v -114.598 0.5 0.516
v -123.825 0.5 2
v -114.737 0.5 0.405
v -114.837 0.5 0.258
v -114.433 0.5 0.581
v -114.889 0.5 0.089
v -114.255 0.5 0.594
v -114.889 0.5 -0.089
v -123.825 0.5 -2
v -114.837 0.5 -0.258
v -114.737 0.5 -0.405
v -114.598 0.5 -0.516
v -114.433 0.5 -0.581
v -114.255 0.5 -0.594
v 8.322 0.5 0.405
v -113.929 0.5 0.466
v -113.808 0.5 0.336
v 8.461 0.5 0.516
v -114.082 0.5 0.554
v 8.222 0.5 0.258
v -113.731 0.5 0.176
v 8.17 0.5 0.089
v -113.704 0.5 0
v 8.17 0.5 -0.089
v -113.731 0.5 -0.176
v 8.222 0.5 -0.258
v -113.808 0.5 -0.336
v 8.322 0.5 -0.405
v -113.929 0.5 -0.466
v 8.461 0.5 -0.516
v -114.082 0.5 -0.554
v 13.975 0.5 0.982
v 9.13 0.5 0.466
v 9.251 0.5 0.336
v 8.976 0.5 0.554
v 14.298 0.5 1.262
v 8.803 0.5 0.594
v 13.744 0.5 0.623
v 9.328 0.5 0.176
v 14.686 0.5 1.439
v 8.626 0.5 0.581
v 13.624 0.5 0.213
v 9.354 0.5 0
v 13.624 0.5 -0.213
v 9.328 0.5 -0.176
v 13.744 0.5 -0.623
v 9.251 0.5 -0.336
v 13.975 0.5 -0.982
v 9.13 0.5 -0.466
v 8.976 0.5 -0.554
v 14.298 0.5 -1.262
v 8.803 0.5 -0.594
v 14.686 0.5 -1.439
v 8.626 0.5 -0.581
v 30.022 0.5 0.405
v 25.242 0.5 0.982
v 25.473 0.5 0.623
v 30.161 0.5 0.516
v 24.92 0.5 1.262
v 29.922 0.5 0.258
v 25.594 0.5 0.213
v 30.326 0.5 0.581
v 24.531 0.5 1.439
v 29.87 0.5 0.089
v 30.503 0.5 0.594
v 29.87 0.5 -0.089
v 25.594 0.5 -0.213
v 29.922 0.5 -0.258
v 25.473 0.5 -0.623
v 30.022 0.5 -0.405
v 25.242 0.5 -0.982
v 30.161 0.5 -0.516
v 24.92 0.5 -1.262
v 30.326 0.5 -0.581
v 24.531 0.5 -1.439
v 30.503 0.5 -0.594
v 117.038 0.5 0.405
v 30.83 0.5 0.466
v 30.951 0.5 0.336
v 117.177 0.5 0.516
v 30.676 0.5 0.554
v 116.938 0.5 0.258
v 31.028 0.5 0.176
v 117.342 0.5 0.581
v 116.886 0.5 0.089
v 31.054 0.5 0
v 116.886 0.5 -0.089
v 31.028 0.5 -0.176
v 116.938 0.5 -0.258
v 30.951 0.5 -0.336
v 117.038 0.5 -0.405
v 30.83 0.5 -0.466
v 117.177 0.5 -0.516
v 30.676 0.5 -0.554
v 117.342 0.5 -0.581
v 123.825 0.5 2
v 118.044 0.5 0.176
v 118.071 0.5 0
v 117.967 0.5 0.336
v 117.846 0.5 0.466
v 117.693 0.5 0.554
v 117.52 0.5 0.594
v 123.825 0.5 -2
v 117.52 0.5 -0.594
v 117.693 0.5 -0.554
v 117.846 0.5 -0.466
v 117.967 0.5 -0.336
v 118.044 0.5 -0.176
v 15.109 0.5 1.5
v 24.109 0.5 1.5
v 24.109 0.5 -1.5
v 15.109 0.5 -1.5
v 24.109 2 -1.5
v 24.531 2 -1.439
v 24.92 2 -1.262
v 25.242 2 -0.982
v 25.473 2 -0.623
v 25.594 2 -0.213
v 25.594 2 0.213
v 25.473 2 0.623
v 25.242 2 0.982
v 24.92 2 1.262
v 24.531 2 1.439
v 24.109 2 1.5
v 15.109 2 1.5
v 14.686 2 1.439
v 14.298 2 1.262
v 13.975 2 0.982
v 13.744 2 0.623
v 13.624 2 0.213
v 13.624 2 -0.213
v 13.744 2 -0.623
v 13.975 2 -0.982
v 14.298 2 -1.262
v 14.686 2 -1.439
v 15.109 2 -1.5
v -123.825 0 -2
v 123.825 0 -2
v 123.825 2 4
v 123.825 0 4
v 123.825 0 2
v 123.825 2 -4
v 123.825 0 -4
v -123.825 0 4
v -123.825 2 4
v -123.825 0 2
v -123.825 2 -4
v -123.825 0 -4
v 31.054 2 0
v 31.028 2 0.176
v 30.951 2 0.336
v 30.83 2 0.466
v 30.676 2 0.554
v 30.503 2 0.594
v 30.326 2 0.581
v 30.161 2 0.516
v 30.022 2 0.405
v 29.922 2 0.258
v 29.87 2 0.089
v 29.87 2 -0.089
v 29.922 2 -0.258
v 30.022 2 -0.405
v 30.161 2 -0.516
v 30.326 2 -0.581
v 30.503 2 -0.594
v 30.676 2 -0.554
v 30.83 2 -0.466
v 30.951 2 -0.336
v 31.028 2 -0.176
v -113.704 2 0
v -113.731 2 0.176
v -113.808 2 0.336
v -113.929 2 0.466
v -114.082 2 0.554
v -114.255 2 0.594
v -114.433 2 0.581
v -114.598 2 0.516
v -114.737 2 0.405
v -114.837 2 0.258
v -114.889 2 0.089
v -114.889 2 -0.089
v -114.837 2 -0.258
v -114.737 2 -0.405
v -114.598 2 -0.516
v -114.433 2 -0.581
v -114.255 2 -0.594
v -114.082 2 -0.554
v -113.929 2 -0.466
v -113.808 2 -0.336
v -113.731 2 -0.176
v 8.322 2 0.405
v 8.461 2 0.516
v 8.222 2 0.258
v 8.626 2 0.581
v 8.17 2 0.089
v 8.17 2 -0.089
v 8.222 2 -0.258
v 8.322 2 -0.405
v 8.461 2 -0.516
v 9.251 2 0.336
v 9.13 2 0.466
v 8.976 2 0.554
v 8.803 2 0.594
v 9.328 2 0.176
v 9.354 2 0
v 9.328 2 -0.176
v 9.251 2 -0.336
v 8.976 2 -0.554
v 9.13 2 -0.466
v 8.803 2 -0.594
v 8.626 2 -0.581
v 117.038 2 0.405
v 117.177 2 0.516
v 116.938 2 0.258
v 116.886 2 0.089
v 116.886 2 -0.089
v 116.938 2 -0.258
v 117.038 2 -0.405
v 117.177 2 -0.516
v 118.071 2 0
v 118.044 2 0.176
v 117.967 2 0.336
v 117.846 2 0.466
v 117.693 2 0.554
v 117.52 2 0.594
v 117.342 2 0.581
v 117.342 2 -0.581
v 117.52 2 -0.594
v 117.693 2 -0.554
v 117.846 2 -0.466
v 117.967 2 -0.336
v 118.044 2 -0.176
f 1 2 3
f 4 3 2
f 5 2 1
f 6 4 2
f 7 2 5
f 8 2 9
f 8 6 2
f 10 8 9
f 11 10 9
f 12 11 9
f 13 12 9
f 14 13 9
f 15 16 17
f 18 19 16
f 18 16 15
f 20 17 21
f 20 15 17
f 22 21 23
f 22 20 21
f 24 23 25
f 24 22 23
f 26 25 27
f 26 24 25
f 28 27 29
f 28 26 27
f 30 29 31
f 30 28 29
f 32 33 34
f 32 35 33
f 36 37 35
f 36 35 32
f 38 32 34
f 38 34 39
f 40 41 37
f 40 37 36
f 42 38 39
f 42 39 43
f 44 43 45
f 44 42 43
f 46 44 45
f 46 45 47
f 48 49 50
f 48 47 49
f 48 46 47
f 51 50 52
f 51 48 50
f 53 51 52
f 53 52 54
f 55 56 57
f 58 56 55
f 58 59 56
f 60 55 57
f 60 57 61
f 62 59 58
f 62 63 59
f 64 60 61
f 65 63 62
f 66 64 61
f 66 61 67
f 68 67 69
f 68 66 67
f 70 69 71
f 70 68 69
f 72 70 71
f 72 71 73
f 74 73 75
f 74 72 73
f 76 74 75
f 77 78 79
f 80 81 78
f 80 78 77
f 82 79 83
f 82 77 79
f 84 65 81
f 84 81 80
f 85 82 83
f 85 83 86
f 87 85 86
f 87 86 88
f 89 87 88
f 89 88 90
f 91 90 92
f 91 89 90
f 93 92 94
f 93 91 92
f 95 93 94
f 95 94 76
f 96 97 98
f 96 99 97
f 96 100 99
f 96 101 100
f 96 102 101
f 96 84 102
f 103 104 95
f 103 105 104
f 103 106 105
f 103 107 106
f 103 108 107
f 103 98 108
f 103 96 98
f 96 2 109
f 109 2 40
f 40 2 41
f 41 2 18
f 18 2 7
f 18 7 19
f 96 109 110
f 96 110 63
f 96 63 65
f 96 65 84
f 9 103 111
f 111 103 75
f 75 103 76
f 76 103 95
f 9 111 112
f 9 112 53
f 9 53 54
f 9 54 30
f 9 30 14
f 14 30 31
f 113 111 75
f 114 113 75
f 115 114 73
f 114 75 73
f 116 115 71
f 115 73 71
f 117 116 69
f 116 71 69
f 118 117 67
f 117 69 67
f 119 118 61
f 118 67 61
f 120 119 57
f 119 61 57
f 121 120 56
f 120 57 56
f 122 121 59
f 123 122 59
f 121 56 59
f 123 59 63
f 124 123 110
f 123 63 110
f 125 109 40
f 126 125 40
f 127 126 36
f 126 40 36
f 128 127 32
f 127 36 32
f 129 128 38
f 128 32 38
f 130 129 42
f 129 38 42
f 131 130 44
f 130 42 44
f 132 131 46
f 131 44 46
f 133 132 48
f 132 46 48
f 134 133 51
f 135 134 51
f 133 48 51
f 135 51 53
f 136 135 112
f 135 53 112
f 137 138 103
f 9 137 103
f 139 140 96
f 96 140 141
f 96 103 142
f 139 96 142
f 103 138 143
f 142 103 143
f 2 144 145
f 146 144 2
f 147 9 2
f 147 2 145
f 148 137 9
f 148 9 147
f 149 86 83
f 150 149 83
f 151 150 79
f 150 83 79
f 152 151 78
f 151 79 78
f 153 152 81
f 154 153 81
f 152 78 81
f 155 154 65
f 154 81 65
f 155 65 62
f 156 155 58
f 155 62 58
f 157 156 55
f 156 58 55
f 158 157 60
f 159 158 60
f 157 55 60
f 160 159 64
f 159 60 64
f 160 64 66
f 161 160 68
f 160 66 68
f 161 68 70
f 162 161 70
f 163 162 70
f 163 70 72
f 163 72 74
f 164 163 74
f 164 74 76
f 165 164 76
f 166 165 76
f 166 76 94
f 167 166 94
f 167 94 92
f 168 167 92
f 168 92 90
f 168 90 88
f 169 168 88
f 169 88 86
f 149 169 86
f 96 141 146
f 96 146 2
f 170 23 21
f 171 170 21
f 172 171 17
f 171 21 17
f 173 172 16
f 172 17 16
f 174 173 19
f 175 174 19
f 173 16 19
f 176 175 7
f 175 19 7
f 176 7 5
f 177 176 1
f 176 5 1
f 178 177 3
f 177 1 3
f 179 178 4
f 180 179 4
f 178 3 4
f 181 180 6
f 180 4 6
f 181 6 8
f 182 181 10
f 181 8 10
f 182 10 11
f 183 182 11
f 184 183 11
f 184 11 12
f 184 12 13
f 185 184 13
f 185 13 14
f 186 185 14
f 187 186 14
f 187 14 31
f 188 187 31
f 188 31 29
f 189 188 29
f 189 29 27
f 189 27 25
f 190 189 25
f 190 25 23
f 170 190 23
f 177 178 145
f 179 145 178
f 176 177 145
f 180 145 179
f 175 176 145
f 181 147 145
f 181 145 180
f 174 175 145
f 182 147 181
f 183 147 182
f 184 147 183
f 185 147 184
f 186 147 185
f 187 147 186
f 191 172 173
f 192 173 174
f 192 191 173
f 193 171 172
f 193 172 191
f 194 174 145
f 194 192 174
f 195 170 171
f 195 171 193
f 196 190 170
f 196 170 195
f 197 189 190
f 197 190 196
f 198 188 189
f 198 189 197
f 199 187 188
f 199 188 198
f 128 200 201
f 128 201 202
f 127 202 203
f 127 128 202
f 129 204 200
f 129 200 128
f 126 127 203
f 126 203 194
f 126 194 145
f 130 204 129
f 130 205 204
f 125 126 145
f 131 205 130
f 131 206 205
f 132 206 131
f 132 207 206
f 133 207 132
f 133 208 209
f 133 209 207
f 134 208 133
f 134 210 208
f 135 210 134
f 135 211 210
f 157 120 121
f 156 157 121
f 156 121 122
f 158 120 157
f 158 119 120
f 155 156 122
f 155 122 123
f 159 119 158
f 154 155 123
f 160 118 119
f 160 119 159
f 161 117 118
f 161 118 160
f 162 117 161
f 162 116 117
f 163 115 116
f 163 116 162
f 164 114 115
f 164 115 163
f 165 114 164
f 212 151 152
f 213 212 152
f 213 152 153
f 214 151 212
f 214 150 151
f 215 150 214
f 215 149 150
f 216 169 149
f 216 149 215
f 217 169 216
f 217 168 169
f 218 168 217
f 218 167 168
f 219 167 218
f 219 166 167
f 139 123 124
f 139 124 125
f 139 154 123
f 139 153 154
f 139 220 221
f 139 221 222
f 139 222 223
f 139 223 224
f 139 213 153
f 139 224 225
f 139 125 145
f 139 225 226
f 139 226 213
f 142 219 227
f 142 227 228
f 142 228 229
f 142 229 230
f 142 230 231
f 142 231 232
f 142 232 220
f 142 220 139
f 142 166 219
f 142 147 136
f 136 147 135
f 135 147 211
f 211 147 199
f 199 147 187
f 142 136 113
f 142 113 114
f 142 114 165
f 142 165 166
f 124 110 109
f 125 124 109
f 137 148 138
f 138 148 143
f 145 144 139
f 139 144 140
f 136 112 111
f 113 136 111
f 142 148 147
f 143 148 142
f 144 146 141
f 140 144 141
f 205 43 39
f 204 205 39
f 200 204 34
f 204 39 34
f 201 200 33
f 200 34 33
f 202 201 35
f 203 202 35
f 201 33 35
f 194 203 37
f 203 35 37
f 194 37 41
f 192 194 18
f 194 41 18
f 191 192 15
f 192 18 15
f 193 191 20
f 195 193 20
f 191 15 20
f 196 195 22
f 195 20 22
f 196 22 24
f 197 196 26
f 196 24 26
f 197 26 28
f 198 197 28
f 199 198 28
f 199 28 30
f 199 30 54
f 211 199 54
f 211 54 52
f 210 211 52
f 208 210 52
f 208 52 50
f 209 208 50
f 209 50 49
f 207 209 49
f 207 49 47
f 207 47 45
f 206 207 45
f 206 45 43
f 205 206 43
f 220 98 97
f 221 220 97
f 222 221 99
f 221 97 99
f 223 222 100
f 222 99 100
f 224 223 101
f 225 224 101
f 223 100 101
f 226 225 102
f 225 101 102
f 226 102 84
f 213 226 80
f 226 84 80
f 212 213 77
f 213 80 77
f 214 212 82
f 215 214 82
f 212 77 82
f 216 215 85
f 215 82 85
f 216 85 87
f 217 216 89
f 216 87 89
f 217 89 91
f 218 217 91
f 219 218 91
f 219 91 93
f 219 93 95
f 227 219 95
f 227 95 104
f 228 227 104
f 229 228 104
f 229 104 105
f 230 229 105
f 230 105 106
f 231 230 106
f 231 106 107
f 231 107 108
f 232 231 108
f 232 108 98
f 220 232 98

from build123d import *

# Parameters (mm, degrees)
SKETCH1_W                 = 247.65
SKETCH1_H                 = 8
BOSS_EXTRUDE1_DEPTH       = 2
SKETCH2_W                 = 4
SKETCH2_H                 = 1
CUT_EXTRUDE1_DEPTH        = 248.65
CUT_EXTRUDE2_DEPTH        = 2.5
F_0_80_TAPPED_HOLE1_D     = 1.19126
F_0_80_TAPPED_HOLE1_DEPTH = 4.572
F_0_80_TAPPED_HOLE1_TIP   = 0.357890611


with BuildPart() as part:
    # Sketch1 → Boss-Extrude1 (new body)
    with BuildSketch(Plane(origin=(0, 0, 0), x_dir=(1, 0, 0), z_dir=(0, 1, 0))):
        Rectangle(SKETCH1_W, SKETCH1_H)
    extrude(amount=BOSS_EXTRUDE1_DEPTH)

    # Sketch2 → Cut-Extrude1 (cut, through all)
    with BuildSketch(Plane(origin=(123.825, 0, 0), x_dir=(0, 0, -1), z_dir=(1, 0, 0))):
        Rectangle(SKETCH2_W, SKETCH2_H)
    extrude(amount=-CUT_EXTRUDE1_DEPTH, mode=Mode.SUBTRACT)

    # Sketch5 → Cut-Extrude2 (cut, through all)
    with BuildSketch(Plane(origin=(0, 0.5, 0), x_dir=(-1, 0, 0), z_dir=(0, 1, 0))):
        with BuildLine():
            Line((-15.1088, -1.5), (-24.1088, -1.5))
            ThreePointArc((-24.1088, -1.5), (-25.6088, 0), (-24.1088, 1.5))
            Line((-24.1088, 1.5), (-15.1088, 1.5))
            ThreePointArc((-15.1088, 1.5), (-13.6088, 0), (-15.1088, -1.5))
        make_face()
    extrude(amount=CUT_EXTRUDE2_DEPTH, mode=Mode.SUBTRACT)

    # #0-80 Tapped Hole1
    with Locations(Plane(origin=(0, 2, 0), x_dir=(-1, 0, 0), z_dir=(0, 1, 0))):
        with Locations((114.3, 0), (-8.7588, 0), (-30.4588, 0), (-117.475, 0)):
            Hole(F_0_80_TAPPED_HOLE1_D / 2, depth=F_0_80_TAPPED_HOLE1_DEPTH)
            with Locations((0, 0, -(F_0_80_TAPPED_HOLE1_DEPTH + F_0_80_TAPPED_HOLE1_TIP / 2))):  # 118° drill point
                Cone(0, F_0_80_TAPPED_HOLE1_D / 2, F_0_80_TAPPED_HOLE1_TIP, mode=Mode.SUBTRACT)


solid = part.part
